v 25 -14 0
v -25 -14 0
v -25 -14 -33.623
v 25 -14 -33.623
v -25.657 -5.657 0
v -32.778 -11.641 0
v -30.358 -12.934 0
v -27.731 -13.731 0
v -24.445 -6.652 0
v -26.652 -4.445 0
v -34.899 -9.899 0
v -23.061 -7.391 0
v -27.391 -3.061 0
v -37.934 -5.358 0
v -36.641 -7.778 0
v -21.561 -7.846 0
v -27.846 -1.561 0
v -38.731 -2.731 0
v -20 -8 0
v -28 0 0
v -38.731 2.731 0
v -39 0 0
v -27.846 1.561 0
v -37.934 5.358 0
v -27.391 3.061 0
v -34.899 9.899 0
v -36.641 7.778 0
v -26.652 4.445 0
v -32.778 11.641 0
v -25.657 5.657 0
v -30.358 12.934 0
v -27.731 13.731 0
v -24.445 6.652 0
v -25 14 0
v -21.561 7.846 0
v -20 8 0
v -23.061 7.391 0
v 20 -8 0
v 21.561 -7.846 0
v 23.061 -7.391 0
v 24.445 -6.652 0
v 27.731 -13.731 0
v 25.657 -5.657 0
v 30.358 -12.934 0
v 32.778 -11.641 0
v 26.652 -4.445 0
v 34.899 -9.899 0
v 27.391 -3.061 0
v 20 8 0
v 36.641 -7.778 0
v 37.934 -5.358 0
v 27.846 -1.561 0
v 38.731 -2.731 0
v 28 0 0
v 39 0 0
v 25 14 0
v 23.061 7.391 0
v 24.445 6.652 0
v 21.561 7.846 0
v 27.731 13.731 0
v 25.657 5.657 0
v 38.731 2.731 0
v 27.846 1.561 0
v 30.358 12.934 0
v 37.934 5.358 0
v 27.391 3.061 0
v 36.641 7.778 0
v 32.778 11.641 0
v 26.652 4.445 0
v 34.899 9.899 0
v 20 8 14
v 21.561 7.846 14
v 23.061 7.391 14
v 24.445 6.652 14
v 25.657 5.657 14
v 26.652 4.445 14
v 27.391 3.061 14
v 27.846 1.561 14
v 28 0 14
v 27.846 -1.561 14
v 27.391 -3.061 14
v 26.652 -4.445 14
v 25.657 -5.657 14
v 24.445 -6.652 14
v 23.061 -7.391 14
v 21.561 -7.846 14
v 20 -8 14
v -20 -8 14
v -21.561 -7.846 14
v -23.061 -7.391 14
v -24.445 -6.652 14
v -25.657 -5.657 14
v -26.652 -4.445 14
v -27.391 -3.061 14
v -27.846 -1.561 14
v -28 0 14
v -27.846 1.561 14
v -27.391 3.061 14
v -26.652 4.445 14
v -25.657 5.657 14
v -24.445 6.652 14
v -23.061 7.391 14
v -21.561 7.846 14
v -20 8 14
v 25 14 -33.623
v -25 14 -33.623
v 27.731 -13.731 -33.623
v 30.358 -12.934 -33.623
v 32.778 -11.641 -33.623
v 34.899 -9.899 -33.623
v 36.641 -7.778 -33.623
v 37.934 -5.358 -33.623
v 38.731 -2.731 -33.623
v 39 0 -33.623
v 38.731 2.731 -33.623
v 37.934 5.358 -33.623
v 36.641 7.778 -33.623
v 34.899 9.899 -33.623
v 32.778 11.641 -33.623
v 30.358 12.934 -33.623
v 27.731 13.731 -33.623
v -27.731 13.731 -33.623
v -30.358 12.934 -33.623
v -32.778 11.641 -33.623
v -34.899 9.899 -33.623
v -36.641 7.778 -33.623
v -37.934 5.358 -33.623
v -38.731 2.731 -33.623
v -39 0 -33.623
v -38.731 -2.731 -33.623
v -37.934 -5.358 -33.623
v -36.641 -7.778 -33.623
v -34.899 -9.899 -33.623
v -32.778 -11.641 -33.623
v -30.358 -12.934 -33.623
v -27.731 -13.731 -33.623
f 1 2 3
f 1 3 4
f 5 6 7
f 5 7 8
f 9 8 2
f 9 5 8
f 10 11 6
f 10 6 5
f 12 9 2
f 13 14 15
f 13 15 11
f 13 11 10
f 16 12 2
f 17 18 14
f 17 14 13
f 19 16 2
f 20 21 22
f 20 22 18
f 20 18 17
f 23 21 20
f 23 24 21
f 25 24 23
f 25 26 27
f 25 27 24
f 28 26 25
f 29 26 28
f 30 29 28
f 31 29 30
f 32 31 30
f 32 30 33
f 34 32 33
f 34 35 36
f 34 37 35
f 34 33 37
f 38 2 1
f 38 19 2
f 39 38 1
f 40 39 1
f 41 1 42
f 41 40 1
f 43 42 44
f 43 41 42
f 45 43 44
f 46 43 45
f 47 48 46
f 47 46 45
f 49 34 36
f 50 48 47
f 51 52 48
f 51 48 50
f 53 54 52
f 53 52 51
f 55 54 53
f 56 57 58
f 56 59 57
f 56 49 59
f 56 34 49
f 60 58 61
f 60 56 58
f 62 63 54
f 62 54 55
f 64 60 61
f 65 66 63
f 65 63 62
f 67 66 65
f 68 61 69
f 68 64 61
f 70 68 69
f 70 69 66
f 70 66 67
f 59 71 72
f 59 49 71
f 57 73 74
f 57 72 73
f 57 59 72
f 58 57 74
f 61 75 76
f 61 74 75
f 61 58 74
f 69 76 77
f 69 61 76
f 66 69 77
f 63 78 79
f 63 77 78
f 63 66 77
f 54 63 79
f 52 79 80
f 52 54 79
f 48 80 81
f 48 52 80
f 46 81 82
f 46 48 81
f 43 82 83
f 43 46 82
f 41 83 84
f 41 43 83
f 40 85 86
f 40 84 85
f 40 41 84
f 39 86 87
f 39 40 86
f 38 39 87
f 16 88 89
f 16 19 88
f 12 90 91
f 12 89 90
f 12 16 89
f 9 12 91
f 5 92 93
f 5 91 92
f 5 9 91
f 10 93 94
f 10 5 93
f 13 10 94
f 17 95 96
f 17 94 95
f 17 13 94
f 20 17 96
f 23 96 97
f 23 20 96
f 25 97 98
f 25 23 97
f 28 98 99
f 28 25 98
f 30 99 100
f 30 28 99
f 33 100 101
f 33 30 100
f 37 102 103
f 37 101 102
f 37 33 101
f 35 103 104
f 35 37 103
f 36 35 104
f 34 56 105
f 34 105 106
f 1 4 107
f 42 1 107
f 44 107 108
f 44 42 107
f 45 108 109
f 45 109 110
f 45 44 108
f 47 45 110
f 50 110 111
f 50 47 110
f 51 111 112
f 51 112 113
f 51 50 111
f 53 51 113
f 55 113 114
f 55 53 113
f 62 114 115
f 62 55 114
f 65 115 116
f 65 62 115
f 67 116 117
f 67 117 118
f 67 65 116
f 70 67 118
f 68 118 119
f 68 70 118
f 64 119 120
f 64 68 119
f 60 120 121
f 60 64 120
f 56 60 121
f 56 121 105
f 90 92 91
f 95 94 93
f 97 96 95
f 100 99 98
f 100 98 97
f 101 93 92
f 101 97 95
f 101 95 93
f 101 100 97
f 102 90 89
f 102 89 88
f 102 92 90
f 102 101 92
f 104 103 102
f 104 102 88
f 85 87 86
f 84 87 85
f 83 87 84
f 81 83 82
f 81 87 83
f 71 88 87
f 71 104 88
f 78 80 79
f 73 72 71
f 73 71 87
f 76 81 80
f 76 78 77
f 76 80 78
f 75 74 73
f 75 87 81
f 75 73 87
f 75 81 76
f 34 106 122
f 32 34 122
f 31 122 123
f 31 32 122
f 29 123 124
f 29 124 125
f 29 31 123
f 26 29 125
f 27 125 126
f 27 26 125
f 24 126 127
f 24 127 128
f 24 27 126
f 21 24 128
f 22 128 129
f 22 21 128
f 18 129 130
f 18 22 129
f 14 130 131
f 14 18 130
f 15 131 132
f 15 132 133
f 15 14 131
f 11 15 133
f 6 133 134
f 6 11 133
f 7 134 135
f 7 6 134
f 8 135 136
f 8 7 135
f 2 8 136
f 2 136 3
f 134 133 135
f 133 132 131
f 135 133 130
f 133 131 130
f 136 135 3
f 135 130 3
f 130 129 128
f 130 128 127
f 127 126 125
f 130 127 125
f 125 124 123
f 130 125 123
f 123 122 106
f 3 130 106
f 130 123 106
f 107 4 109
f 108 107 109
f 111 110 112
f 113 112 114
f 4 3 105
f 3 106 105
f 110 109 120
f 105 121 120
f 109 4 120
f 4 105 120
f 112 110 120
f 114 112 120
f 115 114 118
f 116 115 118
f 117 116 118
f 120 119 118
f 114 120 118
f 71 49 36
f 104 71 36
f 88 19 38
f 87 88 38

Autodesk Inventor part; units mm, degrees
ref_plane "YZ Plane" through (0, 0, 0) normal (1, 0, 0) x (0, 1, 0)
ref_plane "XZ Plane" through (0, 0, 0) normal (0, 1, 0) x (-1, 0, 0)
ref_plane "XY Plane" through (0, 0, 0) normal (0, 0, 1) x (1, 0, 0)
sketch "Skizze1" plane through (0, 0, 0) normal (0, 0, 1) x (1, 0, 0)
  line L0 (-20, 0) -> (20, 0) construction
  line L1 (-20, -8) -> (20, -8)
  line L2 (20, 8) -> (-20, 8)
  arc A0 (-20, 8) -> (-20, -8) centre (-20, 0) ccw
  arc A1 (20, -8) -> (20, 8) centre (20, 0) ccw
  line L3 (-25, 0) -> (25, 0) construction
  line L4 (-25, -14) -> (25, -14)
  line L5 (25, 14) -> (-25, 14)
  arc A2 (-25, 14) -> (-25, -14) centre (-25, 0) ccw
  arc A3 (25, -14) -> (25, 14) centre (25, 0) ccw
  point P0 (0, 0)
  dimension "d0" = 16
  dimension "d1" = 40
  dimension "d2" = 28
  dimension "d3" = 50
extrude "Extrusion1" add sketch "Skizze1" along normal blind 14 contours A0 L2 A1 L1
extrude "Extrusion2" add sketch "Skizze1" against normal blind 33.623 contours A0 L2 A1 L1 | A2 L5 A3 L4
equation "\"Height\" = 47.623"
properties part number "Gabel_DistanzStopper"
